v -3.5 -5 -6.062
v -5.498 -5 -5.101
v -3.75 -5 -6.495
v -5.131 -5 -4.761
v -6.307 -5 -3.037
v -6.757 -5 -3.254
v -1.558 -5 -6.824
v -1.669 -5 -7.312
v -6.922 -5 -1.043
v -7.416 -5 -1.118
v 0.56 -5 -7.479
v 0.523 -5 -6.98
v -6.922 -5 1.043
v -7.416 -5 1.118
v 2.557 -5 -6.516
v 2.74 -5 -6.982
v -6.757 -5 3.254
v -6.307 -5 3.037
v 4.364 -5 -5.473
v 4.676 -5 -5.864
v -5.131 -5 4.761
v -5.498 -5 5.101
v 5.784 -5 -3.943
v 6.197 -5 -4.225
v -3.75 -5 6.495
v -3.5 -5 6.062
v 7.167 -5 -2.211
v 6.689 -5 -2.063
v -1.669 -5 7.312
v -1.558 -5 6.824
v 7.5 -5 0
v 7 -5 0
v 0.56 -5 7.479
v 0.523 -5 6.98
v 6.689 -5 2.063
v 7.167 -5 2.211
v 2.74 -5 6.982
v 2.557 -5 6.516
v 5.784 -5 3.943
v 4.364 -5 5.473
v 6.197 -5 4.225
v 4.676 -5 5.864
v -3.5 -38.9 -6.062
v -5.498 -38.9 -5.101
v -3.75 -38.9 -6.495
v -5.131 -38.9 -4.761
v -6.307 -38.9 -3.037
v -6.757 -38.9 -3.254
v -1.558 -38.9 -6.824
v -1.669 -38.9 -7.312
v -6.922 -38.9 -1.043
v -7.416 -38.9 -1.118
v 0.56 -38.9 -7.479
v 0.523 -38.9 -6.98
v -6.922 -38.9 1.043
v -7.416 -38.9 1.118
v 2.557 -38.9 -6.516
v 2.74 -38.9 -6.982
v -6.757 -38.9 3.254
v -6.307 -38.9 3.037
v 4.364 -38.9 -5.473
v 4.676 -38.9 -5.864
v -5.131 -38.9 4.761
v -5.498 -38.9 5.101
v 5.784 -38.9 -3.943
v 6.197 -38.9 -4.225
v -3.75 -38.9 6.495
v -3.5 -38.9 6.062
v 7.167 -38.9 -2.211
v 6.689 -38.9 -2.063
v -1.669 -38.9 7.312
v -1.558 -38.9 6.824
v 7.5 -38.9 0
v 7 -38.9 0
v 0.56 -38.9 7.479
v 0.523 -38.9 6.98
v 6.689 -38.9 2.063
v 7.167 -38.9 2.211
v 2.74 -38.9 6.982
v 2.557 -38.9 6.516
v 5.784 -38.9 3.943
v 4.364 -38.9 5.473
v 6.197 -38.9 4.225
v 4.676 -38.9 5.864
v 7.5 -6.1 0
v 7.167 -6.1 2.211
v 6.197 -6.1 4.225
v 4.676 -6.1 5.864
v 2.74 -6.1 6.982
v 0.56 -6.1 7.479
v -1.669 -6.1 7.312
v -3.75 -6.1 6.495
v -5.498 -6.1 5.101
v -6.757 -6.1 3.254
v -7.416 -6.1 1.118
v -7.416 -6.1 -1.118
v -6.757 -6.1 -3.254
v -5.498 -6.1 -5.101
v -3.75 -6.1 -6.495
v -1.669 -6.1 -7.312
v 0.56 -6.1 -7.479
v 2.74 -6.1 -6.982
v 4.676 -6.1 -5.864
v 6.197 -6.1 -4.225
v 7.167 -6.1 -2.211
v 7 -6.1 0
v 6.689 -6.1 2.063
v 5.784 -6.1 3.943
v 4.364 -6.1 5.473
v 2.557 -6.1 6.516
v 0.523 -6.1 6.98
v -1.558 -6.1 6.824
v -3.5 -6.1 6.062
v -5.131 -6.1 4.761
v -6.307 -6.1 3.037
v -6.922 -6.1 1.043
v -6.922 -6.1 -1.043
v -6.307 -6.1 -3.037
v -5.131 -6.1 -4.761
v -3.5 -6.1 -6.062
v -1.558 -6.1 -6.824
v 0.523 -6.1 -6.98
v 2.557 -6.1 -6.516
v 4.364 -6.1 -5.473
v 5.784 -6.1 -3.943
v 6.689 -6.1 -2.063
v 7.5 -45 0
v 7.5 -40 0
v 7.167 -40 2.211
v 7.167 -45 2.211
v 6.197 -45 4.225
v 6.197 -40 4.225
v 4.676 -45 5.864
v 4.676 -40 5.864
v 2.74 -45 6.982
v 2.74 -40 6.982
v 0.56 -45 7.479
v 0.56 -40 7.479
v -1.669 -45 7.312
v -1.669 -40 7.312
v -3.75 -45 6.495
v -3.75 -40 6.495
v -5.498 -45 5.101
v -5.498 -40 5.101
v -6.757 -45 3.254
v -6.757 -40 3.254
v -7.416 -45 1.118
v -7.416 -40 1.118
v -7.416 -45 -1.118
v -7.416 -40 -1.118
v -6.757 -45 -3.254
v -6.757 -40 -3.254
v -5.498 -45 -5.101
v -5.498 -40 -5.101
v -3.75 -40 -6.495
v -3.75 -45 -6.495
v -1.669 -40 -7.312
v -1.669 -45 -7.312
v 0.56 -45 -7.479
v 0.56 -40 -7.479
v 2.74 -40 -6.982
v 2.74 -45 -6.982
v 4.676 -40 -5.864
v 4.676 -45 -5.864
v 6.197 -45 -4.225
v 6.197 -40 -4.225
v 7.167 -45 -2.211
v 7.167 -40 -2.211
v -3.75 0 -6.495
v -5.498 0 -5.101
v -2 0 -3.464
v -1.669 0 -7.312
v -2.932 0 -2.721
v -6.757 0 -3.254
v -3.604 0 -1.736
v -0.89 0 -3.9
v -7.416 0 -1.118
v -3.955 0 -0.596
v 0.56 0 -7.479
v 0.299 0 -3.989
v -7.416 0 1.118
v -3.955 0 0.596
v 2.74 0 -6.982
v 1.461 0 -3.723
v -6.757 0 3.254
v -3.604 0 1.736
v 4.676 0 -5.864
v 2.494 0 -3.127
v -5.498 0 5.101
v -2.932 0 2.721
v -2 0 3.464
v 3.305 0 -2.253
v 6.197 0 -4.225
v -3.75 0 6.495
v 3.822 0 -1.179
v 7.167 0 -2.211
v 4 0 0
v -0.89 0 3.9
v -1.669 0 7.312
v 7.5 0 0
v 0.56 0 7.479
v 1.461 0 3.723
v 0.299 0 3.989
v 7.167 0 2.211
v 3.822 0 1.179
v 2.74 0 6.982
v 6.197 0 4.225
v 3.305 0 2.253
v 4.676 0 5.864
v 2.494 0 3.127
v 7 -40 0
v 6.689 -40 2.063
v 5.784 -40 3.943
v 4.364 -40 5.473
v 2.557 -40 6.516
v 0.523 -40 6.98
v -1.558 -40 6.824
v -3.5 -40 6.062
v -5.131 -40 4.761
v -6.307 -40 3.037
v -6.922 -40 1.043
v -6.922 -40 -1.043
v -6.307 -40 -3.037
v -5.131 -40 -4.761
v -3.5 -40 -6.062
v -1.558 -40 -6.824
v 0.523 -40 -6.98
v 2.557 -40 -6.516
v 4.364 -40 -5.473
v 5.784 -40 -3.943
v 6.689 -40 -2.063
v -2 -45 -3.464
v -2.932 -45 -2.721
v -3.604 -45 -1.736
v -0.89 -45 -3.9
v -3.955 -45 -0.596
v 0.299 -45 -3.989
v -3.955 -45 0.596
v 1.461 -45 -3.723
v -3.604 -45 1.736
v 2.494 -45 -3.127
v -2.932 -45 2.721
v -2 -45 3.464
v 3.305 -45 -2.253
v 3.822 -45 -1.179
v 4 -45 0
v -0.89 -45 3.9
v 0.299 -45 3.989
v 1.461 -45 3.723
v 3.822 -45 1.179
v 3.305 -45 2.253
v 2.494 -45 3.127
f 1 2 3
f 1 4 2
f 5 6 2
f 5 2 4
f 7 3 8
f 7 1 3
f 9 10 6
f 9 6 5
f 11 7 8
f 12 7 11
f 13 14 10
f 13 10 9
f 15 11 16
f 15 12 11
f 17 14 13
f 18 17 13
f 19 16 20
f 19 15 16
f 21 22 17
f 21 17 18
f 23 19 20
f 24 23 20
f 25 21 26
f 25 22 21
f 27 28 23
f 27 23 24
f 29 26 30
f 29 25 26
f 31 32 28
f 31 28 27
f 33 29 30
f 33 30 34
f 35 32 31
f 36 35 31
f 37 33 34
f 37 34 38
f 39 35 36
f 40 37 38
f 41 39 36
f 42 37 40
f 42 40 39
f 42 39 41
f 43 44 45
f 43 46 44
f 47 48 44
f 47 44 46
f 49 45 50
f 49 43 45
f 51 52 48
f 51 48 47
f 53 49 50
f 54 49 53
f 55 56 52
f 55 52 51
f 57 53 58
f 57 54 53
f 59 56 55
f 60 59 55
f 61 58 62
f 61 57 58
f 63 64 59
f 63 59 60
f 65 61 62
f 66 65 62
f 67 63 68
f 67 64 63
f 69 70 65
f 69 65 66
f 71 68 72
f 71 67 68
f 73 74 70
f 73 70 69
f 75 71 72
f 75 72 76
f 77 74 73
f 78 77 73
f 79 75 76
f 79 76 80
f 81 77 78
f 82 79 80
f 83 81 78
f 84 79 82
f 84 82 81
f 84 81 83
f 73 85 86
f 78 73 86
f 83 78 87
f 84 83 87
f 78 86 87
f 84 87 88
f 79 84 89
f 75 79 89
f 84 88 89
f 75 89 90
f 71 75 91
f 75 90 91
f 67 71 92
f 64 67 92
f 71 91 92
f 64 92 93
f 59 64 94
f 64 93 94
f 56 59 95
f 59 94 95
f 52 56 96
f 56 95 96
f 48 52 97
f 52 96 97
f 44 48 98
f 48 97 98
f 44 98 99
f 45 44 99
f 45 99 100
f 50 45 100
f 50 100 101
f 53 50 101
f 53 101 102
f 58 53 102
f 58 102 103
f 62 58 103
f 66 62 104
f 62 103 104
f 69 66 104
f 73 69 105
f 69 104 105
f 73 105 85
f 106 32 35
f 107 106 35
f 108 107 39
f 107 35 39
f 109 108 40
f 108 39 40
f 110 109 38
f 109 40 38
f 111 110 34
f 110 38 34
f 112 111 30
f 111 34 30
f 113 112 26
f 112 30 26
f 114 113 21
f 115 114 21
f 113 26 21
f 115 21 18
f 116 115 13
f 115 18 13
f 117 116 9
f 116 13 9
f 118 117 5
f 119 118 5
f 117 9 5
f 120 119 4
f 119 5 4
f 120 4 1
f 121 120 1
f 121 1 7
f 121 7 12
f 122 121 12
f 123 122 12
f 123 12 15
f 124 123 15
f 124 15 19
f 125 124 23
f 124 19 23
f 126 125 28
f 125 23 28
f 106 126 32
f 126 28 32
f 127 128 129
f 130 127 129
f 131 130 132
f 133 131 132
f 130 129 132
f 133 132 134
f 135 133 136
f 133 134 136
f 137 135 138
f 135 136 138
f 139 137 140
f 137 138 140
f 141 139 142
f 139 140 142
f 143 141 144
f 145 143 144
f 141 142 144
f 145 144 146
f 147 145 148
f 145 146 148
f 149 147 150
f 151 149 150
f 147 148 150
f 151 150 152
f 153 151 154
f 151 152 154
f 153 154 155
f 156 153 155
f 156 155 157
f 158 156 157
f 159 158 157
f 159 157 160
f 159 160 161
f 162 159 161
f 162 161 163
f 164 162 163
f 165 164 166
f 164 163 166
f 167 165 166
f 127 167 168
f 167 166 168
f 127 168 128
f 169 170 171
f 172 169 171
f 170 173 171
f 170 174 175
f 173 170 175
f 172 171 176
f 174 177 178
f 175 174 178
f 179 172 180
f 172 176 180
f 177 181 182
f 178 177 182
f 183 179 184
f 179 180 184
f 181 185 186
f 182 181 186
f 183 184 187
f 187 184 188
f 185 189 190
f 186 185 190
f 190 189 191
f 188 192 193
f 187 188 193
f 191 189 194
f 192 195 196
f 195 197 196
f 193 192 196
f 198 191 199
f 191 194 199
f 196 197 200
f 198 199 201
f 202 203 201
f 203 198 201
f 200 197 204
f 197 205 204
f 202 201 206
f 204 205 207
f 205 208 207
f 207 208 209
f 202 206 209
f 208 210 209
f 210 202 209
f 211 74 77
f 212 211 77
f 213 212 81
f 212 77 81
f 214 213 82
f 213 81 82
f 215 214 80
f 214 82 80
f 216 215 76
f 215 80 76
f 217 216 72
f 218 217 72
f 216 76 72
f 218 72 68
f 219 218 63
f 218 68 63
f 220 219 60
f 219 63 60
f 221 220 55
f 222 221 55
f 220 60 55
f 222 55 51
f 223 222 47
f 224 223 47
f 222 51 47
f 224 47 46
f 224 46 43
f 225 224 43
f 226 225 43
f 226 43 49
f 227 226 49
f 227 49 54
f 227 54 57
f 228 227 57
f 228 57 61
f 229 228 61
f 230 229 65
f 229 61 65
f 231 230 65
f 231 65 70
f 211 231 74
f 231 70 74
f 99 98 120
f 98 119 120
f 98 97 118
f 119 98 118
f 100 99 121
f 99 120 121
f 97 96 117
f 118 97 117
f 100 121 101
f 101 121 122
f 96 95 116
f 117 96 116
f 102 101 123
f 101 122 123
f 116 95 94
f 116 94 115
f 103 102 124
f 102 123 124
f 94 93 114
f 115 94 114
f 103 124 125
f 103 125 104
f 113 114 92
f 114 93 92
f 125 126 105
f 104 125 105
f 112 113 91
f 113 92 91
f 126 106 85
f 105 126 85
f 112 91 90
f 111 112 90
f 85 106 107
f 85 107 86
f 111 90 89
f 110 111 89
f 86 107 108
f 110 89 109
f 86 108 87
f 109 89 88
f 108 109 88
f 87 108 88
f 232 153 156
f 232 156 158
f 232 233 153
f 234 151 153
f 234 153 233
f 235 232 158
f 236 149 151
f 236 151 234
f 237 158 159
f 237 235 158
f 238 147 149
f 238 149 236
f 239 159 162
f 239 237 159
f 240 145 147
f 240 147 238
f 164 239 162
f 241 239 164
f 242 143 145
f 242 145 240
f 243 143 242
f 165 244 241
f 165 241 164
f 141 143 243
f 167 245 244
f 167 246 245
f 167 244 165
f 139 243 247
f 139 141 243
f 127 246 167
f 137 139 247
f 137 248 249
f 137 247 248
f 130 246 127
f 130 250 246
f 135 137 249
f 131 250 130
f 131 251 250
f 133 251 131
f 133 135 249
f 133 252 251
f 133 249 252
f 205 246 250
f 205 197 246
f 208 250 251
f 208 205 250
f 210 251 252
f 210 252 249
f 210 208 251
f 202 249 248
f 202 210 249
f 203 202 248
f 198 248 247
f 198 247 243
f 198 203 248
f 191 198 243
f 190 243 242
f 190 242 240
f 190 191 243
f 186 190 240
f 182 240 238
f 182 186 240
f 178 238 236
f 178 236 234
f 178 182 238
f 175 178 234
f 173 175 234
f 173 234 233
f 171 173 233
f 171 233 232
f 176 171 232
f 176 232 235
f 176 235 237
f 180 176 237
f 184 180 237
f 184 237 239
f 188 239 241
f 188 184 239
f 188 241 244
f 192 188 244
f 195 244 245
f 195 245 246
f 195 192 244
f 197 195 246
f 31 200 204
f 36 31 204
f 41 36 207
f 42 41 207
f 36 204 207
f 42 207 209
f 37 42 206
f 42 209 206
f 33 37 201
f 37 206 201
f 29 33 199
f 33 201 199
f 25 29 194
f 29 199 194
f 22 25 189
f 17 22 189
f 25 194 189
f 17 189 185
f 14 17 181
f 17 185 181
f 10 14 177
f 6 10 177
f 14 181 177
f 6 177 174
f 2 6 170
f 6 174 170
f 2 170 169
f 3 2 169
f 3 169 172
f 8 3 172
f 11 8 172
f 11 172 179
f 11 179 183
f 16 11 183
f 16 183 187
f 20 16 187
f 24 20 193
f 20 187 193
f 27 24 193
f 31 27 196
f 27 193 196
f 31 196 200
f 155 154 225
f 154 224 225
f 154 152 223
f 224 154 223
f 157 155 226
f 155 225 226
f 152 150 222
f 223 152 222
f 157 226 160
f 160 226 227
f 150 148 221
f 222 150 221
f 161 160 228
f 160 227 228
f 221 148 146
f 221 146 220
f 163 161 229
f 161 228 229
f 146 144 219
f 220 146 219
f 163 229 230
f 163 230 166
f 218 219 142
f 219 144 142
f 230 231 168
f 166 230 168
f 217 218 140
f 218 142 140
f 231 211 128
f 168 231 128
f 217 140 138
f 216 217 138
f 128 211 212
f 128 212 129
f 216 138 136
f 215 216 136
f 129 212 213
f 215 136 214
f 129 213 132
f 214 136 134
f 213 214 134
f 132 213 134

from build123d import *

# Parameters (mm, degrees)
F0_R     = 7.5
F0_R_2   = 4
F1_DEPTH = 5
F2_R     = 7
F2_R_2   = 4
F3_DEPTH = 1.1
F4_R     = 7.5
F4_R_2   = 7
F4_R_3   = 4
F5_DEPTH = 32.8
F6_R     = 7
F6_R_2   = 4
F7_DEPTH = 1.1
F8_R     = 7.5
F8_R_2   = 7
F8_R_3   = 4
F9_DEPTH = 5


# Not quite as in the source:
# - a feature names something its author has since deleted; it is built from what else it names


with BuildPart() as f1:
    # F0 (on Front) → F1 (new body)
    with BuildSketch(Plane.XZ):
        Circle(F0_R)
        Circle(F0_R_2, mode=Mode.SUBTRACT)
    extrude(amount=F1_DEPTH)

    # F2 (on face) → F3 (join)
    with BuildSketch(Plane.XZ.offset(5)):
        Circle(F2_R)
        Circle(F2_R_2, mode=Mode.SUBTRACT)
    extrude(amount=F3_DEPTH)

    # F4 (on face) → F5 (join)
    with BuildSketch(Plane.XZ.offset(6.1)):
        Circle(F4_R)
        Circle(F4_R_2, mode=Mode.SUBTRACT)
        Circle(F4_R_2)
        Circle(F4_R_3, mode=Mode.SUBTRACT)
    extrude(amount=F5_DEPTH)

    # F6 (on face) → F7 (join)
    with BuildSketch(Plane.XZ.offset(38.9)):
        Circle(F6_R)
        Circle(F6_R_2, mode=Mode.SUBTRACT)
    extrude(amount=F7_DEPTH)

    # F8 (on face) → F9 (join)
    with BuildSketch(Plane.XZ.offset(40)):
        Circle(F8_R)
        Circle(F8_R_2, mode=Mode.SUBTRACT)
        Circle(F8_R_2)
        Circle(F8_R_3, mode=Mode.SUBTRACT)
    extrude(amount=F9_DEPTH)


solid = f1.part
